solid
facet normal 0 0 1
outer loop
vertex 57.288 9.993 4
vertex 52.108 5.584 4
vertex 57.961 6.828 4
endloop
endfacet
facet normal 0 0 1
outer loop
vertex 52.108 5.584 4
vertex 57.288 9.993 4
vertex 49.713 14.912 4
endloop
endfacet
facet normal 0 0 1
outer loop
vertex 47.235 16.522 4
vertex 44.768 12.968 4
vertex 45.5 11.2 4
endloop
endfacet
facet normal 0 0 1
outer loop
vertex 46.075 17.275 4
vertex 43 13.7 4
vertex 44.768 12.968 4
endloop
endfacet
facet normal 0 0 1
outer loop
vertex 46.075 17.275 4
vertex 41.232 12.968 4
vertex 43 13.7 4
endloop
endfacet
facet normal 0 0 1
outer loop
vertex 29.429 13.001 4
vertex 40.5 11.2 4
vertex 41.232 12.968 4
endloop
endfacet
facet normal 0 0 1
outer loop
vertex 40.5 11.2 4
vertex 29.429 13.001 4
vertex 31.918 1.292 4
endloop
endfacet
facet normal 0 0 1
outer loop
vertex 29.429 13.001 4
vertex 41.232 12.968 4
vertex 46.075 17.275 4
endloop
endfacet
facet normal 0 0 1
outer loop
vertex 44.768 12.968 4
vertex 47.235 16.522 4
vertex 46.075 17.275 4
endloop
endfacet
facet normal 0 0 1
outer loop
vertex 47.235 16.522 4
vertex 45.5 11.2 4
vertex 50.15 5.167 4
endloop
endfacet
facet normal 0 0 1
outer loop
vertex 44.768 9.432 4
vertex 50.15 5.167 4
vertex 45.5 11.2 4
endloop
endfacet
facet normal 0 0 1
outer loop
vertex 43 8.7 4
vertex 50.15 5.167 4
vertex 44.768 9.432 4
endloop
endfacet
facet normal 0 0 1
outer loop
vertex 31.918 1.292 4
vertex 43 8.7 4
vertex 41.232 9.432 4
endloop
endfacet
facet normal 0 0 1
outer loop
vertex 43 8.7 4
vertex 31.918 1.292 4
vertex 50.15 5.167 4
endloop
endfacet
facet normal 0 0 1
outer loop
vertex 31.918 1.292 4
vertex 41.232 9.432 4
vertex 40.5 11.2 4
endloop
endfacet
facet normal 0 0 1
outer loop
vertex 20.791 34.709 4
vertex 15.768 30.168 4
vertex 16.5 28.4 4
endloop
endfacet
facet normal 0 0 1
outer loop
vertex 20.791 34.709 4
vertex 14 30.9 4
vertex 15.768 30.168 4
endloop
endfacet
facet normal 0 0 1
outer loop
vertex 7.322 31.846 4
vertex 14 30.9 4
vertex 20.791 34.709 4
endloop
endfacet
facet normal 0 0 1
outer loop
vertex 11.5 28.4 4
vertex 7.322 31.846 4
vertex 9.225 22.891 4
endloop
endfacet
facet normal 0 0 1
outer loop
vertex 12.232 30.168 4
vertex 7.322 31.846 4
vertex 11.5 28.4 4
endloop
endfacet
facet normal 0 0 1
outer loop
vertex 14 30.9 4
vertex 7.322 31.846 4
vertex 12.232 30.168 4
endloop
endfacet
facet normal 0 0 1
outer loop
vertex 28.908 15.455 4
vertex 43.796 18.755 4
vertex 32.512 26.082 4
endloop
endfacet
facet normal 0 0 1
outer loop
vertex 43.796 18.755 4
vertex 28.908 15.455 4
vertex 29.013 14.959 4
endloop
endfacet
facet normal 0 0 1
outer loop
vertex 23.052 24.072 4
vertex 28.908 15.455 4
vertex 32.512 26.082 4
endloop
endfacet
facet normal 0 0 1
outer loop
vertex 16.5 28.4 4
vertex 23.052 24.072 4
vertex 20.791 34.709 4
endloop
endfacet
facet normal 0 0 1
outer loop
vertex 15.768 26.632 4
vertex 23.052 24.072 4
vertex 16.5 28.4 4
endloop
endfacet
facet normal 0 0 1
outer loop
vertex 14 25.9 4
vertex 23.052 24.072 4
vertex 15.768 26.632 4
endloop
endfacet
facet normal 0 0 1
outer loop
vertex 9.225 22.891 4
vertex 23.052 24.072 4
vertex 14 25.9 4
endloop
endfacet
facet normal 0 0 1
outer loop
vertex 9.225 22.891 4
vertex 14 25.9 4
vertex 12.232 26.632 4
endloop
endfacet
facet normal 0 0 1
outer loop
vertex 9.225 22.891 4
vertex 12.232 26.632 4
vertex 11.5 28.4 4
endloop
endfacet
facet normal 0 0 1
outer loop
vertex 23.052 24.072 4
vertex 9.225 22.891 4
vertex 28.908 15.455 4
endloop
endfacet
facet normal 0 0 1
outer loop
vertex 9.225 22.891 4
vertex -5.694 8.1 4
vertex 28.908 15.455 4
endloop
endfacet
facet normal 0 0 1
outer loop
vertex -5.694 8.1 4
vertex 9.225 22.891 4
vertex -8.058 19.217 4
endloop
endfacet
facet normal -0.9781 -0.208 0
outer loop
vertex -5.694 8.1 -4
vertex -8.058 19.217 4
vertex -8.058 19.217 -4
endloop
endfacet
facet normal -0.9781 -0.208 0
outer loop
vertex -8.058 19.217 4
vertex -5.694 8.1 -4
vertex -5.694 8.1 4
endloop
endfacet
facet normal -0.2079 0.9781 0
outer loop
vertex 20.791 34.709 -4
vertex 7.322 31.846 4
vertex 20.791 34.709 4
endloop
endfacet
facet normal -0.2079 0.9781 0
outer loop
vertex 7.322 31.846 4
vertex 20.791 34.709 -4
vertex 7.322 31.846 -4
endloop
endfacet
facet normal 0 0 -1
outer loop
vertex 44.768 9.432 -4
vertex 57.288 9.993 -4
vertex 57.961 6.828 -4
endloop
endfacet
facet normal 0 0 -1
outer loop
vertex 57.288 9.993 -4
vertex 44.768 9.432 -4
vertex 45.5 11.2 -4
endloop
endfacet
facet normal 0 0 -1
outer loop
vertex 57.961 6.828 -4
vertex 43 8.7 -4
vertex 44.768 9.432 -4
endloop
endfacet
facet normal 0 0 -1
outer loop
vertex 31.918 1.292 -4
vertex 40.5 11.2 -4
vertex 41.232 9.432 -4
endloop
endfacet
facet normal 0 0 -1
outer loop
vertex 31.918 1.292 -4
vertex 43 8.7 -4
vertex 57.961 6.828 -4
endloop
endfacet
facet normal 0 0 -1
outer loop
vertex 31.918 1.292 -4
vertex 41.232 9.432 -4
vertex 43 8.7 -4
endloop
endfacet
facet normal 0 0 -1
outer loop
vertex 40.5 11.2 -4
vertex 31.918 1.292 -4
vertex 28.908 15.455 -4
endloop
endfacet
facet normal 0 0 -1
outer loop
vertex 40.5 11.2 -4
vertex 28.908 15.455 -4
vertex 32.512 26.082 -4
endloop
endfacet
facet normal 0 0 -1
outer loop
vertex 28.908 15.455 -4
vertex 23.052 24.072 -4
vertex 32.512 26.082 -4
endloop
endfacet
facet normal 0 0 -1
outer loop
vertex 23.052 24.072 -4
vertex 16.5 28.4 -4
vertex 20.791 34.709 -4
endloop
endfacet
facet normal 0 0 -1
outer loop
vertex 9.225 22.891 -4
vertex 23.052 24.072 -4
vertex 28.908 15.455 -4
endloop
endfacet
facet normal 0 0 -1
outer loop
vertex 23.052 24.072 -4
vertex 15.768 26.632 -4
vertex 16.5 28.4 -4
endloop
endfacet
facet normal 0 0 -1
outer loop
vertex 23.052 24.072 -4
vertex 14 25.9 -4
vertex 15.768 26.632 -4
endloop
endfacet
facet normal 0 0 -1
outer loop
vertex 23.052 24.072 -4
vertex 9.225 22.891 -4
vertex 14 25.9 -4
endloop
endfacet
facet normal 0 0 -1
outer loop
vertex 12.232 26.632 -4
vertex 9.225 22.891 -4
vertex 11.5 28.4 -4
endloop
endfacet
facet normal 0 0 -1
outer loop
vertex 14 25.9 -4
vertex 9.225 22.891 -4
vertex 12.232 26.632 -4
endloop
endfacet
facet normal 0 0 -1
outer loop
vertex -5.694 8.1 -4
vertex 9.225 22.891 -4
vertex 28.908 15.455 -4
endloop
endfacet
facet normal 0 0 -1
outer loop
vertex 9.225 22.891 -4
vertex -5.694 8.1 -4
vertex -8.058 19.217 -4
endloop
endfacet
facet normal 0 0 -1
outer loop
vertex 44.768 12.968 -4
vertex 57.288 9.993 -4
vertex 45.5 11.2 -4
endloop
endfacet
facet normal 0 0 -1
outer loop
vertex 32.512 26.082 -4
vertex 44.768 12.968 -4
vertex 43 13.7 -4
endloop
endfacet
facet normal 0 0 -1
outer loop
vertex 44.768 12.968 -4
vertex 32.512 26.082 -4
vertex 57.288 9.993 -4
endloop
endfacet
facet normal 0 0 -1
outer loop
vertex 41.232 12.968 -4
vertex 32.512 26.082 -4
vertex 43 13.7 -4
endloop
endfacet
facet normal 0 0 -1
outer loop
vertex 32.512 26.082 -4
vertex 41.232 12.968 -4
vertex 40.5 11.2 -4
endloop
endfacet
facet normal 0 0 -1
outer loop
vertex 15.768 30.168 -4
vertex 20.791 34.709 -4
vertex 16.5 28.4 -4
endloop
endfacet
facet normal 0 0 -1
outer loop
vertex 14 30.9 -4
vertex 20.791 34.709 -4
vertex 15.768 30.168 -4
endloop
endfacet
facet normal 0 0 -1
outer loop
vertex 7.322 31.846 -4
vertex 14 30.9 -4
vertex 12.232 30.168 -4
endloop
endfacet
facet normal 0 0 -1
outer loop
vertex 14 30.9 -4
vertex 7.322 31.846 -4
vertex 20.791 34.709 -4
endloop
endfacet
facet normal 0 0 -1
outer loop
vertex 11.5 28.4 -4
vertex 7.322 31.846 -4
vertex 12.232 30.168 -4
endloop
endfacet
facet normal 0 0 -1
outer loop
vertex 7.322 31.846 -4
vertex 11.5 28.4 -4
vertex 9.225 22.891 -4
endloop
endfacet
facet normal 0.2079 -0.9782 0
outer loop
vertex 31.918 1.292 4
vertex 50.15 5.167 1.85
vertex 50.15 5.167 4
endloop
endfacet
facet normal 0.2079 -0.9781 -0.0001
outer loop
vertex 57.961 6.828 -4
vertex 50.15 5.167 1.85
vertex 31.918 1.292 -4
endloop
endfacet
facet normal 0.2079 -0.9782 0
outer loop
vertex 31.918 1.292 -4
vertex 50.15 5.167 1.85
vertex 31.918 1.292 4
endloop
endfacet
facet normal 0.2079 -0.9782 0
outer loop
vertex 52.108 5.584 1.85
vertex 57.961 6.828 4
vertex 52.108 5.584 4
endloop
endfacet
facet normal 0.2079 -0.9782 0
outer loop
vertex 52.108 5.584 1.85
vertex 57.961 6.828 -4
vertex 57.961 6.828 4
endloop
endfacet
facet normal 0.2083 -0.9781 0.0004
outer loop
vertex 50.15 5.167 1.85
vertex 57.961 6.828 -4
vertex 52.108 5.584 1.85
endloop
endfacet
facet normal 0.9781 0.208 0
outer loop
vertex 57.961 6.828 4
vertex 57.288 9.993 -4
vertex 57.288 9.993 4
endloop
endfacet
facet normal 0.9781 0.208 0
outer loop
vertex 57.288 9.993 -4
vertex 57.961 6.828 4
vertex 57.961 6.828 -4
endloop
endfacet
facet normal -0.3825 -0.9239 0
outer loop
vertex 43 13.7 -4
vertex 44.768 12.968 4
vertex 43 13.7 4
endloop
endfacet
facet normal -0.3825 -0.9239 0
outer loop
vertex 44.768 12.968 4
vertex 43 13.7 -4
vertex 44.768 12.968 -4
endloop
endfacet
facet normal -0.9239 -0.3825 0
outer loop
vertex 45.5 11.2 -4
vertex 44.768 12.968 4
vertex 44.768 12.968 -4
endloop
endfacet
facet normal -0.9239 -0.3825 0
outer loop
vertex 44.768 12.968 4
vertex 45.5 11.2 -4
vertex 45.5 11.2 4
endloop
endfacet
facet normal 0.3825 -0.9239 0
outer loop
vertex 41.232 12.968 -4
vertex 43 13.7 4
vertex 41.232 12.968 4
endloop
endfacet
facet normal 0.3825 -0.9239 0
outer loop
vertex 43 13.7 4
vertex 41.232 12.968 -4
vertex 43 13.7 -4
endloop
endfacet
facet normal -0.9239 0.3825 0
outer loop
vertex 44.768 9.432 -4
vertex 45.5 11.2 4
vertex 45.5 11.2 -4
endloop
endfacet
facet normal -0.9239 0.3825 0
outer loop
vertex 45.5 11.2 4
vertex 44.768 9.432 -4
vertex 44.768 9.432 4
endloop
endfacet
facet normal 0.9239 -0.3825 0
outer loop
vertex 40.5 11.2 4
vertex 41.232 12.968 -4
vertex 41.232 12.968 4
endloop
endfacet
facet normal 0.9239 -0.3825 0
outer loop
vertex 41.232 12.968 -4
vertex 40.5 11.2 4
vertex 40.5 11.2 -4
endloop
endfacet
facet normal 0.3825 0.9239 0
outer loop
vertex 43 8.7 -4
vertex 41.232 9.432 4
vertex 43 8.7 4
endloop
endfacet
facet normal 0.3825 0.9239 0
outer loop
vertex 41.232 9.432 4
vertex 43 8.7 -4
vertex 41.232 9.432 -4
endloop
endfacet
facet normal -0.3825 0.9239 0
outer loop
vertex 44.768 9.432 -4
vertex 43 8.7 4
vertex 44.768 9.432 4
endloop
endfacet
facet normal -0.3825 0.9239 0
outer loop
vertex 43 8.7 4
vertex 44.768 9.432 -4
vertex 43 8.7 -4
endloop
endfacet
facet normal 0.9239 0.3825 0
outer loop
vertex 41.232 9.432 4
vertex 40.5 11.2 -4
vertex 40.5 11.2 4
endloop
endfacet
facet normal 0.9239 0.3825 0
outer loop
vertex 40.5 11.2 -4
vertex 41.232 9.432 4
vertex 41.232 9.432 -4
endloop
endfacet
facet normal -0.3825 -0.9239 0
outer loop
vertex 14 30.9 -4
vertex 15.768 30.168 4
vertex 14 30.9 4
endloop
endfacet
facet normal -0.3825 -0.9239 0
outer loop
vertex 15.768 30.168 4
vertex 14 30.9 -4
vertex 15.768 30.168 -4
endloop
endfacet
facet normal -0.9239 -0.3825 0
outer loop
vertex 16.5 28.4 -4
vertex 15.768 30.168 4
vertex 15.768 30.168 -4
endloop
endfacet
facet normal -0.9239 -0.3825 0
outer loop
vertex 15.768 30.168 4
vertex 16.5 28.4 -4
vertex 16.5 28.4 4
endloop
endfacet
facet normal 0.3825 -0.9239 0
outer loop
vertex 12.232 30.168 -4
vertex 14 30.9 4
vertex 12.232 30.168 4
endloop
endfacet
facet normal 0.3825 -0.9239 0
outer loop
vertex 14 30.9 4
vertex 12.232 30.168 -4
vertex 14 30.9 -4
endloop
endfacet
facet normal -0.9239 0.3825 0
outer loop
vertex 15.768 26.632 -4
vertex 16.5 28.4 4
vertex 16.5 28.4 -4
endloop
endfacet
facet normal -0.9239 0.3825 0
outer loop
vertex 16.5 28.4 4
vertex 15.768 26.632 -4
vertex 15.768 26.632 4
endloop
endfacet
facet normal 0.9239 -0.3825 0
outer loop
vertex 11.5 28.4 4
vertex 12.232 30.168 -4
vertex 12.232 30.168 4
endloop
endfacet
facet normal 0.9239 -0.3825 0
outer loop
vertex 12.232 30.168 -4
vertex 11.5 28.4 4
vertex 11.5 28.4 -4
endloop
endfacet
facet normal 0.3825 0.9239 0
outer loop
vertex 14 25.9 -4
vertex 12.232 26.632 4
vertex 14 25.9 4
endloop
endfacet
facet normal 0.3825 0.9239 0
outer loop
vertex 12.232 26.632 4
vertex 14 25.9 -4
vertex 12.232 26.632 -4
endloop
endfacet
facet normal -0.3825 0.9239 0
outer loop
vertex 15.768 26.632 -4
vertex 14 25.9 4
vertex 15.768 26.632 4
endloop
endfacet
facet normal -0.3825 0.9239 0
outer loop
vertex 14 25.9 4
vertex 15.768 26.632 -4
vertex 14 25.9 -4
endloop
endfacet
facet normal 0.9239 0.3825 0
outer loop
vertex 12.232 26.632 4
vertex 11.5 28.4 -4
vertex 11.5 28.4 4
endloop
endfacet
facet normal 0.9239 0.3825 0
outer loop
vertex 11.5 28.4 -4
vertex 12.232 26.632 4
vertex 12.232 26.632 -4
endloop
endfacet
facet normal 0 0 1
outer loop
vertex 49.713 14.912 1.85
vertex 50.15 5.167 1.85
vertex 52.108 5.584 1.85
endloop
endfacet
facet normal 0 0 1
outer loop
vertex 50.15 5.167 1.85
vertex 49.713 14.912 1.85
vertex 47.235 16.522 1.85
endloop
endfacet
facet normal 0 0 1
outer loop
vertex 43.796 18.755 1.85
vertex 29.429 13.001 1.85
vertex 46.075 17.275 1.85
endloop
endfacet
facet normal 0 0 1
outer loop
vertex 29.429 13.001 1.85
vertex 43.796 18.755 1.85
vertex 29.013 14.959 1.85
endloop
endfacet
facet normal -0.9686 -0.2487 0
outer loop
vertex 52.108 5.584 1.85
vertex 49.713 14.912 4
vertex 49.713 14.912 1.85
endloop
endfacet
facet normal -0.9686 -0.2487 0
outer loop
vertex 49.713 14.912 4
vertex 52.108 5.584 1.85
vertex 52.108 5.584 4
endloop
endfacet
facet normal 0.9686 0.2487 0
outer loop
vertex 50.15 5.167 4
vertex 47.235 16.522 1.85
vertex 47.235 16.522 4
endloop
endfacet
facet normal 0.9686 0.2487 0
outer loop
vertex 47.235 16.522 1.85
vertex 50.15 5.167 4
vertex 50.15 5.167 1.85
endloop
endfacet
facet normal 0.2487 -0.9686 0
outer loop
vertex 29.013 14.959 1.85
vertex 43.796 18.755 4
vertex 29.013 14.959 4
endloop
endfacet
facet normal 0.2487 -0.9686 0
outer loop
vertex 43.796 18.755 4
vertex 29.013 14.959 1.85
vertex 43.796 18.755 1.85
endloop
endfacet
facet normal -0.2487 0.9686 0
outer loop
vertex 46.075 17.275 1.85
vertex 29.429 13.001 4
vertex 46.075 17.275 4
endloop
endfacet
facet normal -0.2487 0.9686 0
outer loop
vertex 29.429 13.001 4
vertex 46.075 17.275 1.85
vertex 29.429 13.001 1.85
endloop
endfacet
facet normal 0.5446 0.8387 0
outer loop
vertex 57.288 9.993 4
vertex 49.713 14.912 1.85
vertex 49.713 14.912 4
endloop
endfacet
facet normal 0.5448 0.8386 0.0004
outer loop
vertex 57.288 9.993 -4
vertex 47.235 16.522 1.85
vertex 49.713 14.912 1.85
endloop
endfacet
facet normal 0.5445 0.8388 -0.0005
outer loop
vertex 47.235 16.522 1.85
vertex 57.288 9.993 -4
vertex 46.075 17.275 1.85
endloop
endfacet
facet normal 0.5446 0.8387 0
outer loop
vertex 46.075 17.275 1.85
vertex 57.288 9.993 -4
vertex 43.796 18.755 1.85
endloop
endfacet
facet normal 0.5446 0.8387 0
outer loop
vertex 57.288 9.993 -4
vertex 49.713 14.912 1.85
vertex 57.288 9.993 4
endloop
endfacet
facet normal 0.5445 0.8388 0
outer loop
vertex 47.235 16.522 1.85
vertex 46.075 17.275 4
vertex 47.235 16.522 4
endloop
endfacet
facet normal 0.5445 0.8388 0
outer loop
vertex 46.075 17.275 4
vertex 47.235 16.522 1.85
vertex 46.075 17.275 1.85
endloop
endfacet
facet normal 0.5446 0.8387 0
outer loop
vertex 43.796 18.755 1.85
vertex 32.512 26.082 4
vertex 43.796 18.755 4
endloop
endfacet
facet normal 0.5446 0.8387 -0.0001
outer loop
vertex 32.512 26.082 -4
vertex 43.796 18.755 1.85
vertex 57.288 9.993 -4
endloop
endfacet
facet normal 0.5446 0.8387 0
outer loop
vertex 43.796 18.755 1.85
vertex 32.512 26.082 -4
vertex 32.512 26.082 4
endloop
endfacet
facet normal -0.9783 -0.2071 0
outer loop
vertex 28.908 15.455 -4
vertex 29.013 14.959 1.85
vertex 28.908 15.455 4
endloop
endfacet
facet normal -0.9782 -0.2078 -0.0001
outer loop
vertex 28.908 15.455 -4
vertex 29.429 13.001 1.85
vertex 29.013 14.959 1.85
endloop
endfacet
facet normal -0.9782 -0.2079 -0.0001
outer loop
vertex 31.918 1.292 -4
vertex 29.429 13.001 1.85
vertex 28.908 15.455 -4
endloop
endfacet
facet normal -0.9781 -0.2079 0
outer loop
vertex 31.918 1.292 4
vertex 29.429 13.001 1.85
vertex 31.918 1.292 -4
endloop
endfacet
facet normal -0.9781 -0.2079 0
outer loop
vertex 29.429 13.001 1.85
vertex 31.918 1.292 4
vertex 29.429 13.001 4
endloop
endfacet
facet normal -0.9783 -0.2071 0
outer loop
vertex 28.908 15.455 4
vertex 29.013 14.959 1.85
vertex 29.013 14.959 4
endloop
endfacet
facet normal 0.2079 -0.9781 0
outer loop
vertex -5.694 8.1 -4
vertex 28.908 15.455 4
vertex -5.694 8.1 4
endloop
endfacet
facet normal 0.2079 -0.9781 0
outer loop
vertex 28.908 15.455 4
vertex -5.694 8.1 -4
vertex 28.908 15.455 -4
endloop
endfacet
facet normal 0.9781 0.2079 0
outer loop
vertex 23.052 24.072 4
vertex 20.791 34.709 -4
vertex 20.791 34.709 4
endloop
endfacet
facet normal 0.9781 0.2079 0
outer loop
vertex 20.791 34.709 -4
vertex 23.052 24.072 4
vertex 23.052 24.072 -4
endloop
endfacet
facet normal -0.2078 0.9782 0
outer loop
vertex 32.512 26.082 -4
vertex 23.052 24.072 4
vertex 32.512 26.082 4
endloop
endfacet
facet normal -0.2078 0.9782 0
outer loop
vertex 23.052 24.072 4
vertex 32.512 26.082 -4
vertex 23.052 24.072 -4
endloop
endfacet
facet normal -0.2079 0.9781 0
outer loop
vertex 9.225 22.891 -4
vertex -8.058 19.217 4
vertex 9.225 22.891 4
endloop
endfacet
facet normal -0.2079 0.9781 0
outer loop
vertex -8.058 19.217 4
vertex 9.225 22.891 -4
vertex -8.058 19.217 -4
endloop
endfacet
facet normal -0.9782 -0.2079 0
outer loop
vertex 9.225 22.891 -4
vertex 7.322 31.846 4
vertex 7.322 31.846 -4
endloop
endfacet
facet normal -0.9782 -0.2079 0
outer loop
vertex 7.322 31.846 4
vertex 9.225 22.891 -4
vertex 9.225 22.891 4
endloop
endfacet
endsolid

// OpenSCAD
//
// Block to hold tubing and modulate liquid flow
// 

module rotary()
{
	module hole(r, h) {
		rotate([0,0,0])
			cylinder(r=r, h=h,center=true);
	}

	difference() {
	// BODY (to be subtracted from)
	 translate([long,width/2,0])
	  rotate([0,0,alpha])
	   cube([length,width,thick],center=true);

	// MOUNTING HOLES
	 translate([long+19,2*offset,0])
	   hole(hradius, thickplus);

   translate([medium+4, width-offset-1, 0])
	   hole( hradius, thickplus);

	// WIRE TROUGH
	 translate([long+25,2+width/3,thickplus/2-dia])
	   rotate([0,0,90+1.2*alpha])
            cube([2*length,dia, dia+0.3],center=true);

	 translate([long+4,2+width/3,thickplus/2-dia])
	   rotate([0,0,1.2*alpha])
            cube([2*length,dia, dia+0.3],center=true);

    // WIRE CUT-OUT
	 translate([long+width-8,width-9,0])
	  rotate([0,0,45+alpha])
	   cube([20,32,thickplus],center=true);

	// CORNER CUT-OUTS
	 translate([long-6-width/2,0,0])
	  rotate([0,0,alpha])
	   cube([length,width/1.9,thickplus],center=true);

	 translate([long+13,width-2,0])
	  rotate([0,0,alpha])
	   cube([length/2,width/3,thickplus],center=true);

	 translate([medium-12,width-9,0])
	  rotate([0,0,alpha])
	   cube([length/3,2+width/4,thickplus],center=true);
}

	alpha  = 12; // Angle between radials in degrees

	length = 62; // mm   Main Block
	width  = 35; // mm
	thick = 8;  // 8mm

	thickplus = thick + 2;  // plus margin

	long   = 24; // mm  // Distances from center
	medium = 10; // mm
//	long   = 154; // mm  // Distances from center
//	medium = 133; // mm
	short  = 120; // mm

	hradius = 2.5;    // mounting hole radius mm
	dia     = 2.0;  // wire trough mm
	offset  = 5.6;  // distance from edge to mounting hole
}

rotary();
